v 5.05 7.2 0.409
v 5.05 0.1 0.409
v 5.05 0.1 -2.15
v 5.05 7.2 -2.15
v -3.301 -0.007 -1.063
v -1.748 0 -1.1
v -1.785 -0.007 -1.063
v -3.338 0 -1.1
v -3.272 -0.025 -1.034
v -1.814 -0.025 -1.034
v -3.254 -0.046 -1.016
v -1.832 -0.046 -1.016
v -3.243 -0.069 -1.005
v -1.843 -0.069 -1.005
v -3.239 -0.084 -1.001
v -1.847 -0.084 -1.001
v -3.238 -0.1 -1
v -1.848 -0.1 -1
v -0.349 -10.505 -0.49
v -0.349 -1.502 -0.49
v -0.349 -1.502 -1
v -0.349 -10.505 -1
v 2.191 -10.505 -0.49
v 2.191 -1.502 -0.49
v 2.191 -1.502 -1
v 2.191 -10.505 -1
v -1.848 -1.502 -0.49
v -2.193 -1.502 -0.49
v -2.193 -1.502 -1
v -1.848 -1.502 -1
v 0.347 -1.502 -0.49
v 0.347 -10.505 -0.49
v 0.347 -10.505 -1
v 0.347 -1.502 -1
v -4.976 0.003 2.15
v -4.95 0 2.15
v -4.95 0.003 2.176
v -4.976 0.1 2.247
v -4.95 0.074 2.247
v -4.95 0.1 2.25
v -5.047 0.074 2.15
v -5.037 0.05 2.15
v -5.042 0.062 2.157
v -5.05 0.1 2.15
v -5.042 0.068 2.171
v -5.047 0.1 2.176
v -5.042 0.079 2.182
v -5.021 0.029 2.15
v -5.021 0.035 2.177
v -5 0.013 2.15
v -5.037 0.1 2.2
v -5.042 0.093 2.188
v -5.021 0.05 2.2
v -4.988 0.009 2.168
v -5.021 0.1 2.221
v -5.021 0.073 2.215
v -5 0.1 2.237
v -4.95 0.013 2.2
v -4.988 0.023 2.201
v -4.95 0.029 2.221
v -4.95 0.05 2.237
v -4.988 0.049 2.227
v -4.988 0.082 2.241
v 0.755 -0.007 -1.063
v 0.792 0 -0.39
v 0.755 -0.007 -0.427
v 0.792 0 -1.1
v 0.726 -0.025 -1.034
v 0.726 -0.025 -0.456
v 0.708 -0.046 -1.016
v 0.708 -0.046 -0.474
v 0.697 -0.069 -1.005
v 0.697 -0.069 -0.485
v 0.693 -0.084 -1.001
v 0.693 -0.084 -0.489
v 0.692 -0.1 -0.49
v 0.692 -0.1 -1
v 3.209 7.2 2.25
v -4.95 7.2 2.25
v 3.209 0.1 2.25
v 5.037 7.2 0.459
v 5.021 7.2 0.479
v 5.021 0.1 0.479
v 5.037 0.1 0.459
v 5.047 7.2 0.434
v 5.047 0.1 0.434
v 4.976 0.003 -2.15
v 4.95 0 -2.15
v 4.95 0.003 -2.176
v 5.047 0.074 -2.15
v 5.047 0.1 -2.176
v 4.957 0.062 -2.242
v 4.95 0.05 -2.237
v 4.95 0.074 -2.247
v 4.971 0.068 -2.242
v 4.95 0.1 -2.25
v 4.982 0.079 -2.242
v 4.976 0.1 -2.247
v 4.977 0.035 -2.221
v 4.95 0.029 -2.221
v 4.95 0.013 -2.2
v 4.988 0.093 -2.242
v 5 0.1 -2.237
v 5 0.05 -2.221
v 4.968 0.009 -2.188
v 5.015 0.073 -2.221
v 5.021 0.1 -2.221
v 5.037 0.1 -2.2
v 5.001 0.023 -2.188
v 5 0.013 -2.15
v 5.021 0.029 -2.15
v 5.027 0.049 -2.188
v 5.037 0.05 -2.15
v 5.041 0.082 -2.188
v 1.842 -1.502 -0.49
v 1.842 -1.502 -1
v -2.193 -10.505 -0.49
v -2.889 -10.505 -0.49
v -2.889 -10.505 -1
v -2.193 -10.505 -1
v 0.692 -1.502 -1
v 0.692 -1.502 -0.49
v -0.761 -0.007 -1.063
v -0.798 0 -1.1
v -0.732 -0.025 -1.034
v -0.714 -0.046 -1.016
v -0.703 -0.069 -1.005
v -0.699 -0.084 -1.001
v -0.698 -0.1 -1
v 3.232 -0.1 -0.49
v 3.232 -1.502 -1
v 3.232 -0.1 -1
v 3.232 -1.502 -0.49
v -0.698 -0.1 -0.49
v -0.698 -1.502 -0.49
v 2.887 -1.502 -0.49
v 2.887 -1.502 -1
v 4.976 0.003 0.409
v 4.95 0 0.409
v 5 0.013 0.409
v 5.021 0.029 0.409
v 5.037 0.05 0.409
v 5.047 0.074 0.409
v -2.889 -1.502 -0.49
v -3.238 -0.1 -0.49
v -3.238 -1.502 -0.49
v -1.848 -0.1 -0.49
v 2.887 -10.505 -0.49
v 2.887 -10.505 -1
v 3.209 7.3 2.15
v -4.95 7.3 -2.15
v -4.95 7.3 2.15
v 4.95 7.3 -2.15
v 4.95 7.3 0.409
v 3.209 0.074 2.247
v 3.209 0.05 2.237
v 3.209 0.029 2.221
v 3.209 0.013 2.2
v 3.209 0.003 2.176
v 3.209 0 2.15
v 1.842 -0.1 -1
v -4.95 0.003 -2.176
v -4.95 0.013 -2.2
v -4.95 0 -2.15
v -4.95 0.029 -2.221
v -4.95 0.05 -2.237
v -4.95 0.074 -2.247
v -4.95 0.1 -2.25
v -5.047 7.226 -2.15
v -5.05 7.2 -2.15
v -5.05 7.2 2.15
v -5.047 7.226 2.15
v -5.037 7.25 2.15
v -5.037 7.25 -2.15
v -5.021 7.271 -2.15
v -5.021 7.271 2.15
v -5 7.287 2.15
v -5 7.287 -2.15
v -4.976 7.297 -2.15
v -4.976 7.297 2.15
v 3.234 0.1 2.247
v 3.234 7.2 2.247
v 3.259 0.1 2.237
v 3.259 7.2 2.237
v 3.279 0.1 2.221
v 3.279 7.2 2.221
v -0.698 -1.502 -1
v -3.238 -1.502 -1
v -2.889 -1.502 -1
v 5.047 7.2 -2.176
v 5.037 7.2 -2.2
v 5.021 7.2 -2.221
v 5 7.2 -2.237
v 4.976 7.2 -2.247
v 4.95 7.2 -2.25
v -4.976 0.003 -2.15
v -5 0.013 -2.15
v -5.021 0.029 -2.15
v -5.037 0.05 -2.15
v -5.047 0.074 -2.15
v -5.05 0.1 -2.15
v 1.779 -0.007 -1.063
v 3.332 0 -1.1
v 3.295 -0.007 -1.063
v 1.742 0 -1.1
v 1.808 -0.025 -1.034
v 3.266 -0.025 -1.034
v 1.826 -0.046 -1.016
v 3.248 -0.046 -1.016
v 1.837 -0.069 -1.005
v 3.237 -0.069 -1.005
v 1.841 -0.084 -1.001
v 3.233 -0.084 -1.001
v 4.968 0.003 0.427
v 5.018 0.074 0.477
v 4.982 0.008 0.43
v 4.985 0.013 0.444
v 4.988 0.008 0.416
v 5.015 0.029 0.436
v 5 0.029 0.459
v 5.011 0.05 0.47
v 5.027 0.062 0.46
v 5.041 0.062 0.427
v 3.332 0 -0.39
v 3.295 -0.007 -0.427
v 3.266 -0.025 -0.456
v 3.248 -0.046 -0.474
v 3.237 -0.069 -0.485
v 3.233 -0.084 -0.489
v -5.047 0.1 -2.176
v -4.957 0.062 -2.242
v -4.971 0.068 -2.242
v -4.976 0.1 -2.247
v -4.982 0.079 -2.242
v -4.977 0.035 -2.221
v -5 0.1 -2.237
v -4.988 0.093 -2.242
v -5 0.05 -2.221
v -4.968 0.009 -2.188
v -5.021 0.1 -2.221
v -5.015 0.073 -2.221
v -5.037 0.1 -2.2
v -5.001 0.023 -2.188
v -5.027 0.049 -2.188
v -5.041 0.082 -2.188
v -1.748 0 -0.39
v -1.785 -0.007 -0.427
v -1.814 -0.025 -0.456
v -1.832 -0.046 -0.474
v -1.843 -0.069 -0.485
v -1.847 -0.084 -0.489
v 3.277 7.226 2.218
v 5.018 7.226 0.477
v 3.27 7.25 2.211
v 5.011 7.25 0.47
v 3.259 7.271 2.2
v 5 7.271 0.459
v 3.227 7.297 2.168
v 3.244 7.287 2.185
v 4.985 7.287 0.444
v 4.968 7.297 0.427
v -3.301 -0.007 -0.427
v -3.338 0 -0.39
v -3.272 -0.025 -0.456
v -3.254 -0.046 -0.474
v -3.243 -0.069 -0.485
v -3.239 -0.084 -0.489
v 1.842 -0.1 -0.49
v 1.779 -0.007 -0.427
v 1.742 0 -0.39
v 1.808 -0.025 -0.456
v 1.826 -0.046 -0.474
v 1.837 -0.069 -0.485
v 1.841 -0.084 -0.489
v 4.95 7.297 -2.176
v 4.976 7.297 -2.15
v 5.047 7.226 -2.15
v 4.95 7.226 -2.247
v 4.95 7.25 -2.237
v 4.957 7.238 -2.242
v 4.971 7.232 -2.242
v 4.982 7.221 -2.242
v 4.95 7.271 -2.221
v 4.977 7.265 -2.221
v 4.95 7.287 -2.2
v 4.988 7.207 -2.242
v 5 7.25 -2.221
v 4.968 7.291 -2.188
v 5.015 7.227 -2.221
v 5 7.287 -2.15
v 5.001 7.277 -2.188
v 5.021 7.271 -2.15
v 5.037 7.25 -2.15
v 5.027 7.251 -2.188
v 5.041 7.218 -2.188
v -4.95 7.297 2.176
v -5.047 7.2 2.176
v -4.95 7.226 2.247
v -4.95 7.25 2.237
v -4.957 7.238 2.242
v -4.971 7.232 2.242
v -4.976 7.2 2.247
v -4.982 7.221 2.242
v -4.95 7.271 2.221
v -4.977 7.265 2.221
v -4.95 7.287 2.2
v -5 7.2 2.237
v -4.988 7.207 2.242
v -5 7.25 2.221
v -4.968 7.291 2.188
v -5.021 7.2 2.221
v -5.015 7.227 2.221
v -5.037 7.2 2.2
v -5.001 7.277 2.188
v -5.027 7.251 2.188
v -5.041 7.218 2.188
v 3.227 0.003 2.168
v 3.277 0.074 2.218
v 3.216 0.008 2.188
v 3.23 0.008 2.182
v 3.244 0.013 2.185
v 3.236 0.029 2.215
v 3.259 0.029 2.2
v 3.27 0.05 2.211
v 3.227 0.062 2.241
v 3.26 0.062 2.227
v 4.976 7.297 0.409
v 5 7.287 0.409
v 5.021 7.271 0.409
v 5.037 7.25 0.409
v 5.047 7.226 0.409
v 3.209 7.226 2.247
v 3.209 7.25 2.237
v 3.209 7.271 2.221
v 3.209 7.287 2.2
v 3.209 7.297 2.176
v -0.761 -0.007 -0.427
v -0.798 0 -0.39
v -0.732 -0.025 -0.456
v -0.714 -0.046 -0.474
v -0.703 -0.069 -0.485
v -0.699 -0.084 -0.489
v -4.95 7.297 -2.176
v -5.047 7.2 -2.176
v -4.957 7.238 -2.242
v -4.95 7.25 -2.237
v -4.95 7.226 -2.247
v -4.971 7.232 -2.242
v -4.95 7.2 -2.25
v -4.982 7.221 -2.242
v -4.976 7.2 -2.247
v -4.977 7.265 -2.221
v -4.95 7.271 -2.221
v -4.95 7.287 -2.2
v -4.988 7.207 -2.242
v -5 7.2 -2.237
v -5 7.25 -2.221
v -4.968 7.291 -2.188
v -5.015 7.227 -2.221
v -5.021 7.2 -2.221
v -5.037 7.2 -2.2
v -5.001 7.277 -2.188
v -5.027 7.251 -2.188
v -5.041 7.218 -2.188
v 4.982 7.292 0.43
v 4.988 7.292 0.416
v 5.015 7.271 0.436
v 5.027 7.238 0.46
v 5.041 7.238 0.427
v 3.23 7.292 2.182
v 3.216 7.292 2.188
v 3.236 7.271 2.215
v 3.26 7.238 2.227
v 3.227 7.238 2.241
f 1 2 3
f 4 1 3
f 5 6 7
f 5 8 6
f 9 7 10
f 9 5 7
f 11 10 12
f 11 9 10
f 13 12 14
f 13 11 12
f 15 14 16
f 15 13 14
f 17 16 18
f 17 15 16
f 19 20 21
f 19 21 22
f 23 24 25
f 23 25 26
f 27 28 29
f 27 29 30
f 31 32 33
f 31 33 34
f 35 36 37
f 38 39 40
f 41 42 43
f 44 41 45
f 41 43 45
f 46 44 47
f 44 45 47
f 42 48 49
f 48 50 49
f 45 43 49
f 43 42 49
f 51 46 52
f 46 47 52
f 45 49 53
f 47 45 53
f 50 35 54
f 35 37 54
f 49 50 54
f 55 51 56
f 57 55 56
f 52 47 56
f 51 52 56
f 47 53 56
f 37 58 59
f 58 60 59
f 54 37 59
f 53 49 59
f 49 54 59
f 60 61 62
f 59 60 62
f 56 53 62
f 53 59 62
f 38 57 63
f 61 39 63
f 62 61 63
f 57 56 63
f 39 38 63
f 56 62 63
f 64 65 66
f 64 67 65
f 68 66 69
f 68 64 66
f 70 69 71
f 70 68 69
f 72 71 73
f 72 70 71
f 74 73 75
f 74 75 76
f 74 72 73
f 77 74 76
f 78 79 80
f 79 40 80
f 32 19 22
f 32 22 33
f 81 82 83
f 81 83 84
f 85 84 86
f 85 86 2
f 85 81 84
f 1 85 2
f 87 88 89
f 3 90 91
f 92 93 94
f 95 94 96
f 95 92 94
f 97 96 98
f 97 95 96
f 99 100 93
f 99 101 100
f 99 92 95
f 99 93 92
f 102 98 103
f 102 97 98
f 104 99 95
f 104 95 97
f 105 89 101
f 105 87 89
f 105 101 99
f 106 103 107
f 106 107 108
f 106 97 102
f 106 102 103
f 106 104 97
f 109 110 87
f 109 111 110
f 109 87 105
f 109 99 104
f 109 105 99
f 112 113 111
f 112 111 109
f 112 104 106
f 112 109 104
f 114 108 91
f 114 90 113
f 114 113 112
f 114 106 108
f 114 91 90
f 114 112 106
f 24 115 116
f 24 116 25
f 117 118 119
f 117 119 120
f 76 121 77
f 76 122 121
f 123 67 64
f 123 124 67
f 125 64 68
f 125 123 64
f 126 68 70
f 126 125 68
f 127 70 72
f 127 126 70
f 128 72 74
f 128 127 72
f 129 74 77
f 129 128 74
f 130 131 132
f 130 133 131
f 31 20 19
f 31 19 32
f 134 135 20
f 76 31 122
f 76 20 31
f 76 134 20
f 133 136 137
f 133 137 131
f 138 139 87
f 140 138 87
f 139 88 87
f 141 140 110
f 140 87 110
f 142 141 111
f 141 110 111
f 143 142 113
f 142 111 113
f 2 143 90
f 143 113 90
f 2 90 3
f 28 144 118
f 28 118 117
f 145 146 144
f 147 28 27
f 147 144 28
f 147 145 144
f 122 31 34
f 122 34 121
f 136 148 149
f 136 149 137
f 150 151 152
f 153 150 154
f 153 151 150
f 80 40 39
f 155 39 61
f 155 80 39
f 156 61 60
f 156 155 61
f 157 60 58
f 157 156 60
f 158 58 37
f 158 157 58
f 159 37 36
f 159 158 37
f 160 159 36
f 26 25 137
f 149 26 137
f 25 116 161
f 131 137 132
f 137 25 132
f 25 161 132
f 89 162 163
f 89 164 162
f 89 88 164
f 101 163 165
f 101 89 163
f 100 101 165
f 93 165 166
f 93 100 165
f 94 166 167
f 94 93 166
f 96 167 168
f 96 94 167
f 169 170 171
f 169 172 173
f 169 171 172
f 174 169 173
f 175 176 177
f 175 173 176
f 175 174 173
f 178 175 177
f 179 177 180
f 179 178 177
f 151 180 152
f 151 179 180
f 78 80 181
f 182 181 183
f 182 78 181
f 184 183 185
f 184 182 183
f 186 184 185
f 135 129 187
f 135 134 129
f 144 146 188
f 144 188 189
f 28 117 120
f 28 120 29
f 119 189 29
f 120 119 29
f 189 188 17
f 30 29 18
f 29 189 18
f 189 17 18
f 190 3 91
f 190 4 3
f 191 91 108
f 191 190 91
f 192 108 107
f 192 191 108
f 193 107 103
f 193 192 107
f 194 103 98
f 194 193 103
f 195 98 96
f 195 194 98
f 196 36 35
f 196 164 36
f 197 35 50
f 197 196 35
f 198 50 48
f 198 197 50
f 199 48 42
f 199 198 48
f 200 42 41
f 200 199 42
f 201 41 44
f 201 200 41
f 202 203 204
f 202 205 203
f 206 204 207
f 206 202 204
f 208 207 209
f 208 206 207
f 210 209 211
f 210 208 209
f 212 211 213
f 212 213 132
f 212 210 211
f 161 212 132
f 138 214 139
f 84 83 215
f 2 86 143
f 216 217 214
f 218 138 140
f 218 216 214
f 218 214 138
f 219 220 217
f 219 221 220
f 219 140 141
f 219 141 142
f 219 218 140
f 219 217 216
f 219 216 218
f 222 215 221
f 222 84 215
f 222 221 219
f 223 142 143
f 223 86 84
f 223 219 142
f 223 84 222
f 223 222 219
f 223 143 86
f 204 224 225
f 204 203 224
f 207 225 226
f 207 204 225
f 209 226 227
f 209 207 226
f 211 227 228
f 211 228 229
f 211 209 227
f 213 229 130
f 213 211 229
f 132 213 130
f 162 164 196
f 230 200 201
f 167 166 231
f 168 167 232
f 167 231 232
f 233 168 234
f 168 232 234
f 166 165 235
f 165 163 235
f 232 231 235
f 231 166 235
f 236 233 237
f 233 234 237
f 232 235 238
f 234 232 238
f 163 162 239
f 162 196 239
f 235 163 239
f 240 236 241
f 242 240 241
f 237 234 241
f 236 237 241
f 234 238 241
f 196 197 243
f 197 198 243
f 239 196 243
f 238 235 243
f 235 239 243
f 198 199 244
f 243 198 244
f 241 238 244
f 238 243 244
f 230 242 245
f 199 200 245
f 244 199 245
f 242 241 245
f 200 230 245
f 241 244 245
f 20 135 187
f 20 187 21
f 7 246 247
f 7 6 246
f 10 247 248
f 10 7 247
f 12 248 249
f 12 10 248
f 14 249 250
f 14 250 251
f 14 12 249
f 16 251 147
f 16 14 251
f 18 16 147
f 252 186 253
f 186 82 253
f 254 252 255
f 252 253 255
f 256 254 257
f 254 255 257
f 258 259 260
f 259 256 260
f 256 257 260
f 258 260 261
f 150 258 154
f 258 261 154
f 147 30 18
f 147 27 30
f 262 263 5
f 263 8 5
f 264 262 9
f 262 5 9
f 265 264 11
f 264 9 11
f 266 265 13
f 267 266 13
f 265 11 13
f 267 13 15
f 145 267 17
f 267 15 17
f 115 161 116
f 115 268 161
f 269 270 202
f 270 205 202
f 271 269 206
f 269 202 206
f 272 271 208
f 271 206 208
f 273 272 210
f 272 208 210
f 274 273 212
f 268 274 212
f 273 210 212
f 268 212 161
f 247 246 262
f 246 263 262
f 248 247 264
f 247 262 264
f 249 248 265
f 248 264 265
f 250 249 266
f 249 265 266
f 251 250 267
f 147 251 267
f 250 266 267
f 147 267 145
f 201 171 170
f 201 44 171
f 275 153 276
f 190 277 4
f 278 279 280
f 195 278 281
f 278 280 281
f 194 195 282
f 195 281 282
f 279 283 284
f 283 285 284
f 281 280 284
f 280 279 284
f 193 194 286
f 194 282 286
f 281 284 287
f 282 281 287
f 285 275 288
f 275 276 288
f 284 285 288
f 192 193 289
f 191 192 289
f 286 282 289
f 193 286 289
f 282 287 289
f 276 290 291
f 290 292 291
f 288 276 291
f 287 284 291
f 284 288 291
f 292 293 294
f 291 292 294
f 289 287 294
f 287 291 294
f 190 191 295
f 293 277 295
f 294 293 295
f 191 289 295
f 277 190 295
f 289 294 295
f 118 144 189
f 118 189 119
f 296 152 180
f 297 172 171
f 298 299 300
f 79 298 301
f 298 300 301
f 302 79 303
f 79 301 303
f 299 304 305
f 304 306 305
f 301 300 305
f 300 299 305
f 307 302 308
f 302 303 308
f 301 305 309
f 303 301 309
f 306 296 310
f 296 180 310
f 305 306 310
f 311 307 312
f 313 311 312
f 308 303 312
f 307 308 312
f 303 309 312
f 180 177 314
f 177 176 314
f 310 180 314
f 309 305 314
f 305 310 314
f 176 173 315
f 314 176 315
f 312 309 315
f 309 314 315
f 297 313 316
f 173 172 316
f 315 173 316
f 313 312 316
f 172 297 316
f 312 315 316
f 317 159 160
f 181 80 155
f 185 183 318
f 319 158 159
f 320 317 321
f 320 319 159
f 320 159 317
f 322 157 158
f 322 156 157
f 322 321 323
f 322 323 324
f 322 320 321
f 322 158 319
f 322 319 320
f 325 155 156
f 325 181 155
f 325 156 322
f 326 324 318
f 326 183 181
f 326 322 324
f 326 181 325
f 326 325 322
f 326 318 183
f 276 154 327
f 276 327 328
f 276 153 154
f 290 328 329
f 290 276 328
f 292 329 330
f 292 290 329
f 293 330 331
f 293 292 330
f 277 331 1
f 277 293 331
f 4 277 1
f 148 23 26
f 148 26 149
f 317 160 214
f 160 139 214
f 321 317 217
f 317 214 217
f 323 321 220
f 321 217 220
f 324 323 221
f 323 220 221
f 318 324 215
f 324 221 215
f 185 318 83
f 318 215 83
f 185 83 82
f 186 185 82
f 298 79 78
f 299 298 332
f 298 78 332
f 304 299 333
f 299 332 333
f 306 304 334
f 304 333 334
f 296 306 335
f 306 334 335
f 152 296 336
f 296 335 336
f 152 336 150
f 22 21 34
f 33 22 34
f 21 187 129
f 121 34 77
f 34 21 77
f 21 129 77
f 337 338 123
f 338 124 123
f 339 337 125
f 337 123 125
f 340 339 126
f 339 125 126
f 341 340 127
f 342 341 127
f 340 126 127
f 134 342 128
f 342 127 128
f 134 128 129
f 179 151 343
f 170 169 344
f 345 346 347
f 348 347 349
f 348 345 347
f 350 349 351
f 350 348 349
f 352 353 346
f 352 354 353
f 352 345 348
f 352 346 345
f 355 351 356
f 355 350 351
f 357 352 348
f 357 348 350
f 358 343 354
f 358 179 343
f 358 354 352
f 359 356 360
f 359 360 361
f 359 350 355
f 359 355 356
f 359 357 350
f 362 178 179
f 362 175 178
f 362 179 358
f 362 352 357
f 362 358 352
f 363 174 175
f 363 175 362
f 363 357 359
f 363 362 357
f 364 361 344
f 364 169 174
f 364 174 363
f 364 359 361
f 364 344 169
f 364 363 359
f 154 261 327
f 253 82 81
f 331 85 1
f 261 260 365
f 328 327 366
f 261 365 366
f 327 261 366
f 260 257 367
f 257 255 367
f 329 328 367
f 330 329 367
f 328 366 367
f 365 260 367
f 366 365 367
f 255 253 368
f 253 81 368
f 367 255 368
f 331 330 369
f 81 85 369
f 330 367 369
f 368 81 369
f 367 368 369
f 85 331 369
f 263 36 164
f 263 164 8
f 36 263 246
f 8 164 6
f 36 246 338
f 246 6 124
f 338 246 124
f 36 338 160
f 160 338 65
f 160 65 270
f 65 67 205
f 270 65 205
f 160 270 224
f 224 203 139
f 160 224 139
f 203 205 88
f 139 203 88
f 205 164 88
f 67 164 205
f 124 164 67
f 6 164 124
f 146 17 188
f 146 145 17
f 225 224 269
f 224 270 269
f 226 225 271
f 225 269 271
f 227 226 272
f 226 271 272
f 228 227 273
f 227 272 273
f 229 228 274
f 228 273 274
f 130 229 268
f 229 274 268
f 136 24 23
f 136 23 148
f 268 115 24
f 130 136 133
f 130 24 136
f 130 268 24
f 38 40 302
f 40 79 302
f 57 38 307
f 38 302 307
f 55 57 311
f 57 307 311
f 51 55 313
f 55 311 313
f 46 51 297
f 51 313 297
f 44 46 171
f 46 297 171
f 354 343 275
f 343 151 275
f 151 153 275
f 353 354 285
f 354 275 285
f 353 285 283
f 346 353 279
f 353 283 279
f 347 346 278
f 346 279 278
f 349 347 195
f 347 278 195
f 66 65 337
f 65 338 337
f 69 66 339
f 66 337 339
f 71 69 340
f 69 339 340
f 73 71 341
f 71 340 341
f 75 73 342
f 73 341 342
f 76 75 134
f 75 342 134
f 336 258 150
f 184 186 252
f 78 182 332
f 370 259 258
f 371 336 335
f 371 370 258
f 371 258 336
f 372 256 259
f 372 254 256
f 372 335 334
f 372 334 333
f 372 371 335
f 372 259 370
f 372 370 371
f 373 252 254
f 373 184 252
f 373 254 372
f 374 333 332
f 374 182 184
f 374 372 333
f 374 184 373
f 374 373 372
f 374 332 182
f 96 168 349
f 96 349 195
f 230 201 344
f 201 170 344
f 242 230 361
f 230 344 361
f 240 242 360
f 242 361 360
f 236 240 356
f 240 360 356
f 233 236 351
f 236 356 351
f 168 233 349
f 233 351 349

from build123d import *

# Parameters (mm, degrees)
SKIZZE1_W                       = 10.1
SKIZZE1_H                       = 4.5
AUFSATZ_LINEAR_AUSTRAGEN1_DEPTH = 7.3
FASE2_SIZE                      = 1.8
AUFSATZ_LINEAR_AUSTRAGEN2_DEPTH = 0.255
LINEARES_MUSTER1_COUNT          = 2
LINEARES_MUSTER1_PITCH          = 2.54
LINEARES_MUSTER1_COL_COUNT      = 2
LINEARES_MUSTER1_COL_PITCH      = 2.54
VERRUNDUNG1_R                   = 0.1


with BuildPart() as part:
    # Skizze1 → Aufsatz-Linear austragen1 (new body)
    with BuildSketch(Plane(origin=(0, 0, 0), x_dir=(1, 0, 0), z_dir=(0, 1, 0))):
        Rectangle(SKIZZE1_W, SKIZZE1_H)
    extrude(amount=AUFSATZ_LINEAR_AUSTRAGEN1_DEPTH)

    # Fase2
    fase2_edges = [part.edges().sort_by_distance(p)[0] for p in [
        (5.05, 3.65, 2.25),
    ]]
    chamfer(fase2_edges, length=FASE2_SIZE)

    # Skizze3 → Aufsatz-Linear austragen2 (add, symmetric)
    with BuildSketch(Plane.XY.offset(-0.745)):
        Polygon((0, 0), (-0.698236912, 0), (-0.698236912, -1.502157044), (-0.349118456, -1.502157044), (-0.349118456, -10.505351049), (0.346596575, -10.505351049), (0.346596575, -1.502157044), (0.692124121, -1.502157044), (0.692124121, 0), align=None)
    aufsatz_linear_austragen2 = extrude(amount=AUFSATZ_LINEAR_AUSTRAGEN2_DEPTH, both=True)

    # Lineares Muster1: Aufsatz-Linear austragen2 ×2
    with Locations(*[(i * LINEARES_MUSTER1_PITCH, 0, 0) for i in range(1, LINEARES_MUSTER1_COUNT)]):
        add(aufsatz_linear_austragen2)

    # Lineares Muster1 col: Aufsatz-Linear austragen2 ×2
    with Locations(*[(-i * LINEARES_MUSTER1_COL_PITCH, 0, 0) for i in range(1, LINEARES_MUSTER1_COL_COUNT)]):
        add(aufsatz_linear_austragen2)

    # Verrundung1
    verrundung1_edges = [part.edges().sort_by_distance(p)[0] for p in [
        (-5.05, 7.3, 0),
        (-0.9, 7.3, 2.25),
        (5.05, 0, -0.9),
        (5.05, 7.3, -0.9),
        (5.05, 3.65, 0.45),
        (4.15, 0, 1.35),
        (3.25, 3.65, 2.25),
        (4.15, 7.3, 1.35),
        (0.692124121, 0, -0.745),
        (-0.698236912, 0, -0.745),
        (-0.003056396, 0, -1),
        (-0.003056396, 0, -0.49),
        (-1.847875879, 0, -0.745),
        (-0.9, 0, 2.25),
        (-3.238236912, 0, -0.745),
        (-2.543056396, 0, -1),
        (-2.543056396, 0, -0.49),
        (-5.05, 0, 0),
        (0, 0, -2.25),
        (3.232124121, 0, -0.745),
        (1.841763088, 0, -0.745),
        (2.536943604, 0, -1),
        (2.536943604, 0, -0.49),
        (0, 7.3, -2.25),
        (-5.05, 3.65, 2.25),
        (-5.05, 3.65, -2.25),
        (5.05, 3.65, -2.25),
    ]]
    fillet(verrundung1_edges, radius=VERRUNDUNG1_R)


solid = part.part
